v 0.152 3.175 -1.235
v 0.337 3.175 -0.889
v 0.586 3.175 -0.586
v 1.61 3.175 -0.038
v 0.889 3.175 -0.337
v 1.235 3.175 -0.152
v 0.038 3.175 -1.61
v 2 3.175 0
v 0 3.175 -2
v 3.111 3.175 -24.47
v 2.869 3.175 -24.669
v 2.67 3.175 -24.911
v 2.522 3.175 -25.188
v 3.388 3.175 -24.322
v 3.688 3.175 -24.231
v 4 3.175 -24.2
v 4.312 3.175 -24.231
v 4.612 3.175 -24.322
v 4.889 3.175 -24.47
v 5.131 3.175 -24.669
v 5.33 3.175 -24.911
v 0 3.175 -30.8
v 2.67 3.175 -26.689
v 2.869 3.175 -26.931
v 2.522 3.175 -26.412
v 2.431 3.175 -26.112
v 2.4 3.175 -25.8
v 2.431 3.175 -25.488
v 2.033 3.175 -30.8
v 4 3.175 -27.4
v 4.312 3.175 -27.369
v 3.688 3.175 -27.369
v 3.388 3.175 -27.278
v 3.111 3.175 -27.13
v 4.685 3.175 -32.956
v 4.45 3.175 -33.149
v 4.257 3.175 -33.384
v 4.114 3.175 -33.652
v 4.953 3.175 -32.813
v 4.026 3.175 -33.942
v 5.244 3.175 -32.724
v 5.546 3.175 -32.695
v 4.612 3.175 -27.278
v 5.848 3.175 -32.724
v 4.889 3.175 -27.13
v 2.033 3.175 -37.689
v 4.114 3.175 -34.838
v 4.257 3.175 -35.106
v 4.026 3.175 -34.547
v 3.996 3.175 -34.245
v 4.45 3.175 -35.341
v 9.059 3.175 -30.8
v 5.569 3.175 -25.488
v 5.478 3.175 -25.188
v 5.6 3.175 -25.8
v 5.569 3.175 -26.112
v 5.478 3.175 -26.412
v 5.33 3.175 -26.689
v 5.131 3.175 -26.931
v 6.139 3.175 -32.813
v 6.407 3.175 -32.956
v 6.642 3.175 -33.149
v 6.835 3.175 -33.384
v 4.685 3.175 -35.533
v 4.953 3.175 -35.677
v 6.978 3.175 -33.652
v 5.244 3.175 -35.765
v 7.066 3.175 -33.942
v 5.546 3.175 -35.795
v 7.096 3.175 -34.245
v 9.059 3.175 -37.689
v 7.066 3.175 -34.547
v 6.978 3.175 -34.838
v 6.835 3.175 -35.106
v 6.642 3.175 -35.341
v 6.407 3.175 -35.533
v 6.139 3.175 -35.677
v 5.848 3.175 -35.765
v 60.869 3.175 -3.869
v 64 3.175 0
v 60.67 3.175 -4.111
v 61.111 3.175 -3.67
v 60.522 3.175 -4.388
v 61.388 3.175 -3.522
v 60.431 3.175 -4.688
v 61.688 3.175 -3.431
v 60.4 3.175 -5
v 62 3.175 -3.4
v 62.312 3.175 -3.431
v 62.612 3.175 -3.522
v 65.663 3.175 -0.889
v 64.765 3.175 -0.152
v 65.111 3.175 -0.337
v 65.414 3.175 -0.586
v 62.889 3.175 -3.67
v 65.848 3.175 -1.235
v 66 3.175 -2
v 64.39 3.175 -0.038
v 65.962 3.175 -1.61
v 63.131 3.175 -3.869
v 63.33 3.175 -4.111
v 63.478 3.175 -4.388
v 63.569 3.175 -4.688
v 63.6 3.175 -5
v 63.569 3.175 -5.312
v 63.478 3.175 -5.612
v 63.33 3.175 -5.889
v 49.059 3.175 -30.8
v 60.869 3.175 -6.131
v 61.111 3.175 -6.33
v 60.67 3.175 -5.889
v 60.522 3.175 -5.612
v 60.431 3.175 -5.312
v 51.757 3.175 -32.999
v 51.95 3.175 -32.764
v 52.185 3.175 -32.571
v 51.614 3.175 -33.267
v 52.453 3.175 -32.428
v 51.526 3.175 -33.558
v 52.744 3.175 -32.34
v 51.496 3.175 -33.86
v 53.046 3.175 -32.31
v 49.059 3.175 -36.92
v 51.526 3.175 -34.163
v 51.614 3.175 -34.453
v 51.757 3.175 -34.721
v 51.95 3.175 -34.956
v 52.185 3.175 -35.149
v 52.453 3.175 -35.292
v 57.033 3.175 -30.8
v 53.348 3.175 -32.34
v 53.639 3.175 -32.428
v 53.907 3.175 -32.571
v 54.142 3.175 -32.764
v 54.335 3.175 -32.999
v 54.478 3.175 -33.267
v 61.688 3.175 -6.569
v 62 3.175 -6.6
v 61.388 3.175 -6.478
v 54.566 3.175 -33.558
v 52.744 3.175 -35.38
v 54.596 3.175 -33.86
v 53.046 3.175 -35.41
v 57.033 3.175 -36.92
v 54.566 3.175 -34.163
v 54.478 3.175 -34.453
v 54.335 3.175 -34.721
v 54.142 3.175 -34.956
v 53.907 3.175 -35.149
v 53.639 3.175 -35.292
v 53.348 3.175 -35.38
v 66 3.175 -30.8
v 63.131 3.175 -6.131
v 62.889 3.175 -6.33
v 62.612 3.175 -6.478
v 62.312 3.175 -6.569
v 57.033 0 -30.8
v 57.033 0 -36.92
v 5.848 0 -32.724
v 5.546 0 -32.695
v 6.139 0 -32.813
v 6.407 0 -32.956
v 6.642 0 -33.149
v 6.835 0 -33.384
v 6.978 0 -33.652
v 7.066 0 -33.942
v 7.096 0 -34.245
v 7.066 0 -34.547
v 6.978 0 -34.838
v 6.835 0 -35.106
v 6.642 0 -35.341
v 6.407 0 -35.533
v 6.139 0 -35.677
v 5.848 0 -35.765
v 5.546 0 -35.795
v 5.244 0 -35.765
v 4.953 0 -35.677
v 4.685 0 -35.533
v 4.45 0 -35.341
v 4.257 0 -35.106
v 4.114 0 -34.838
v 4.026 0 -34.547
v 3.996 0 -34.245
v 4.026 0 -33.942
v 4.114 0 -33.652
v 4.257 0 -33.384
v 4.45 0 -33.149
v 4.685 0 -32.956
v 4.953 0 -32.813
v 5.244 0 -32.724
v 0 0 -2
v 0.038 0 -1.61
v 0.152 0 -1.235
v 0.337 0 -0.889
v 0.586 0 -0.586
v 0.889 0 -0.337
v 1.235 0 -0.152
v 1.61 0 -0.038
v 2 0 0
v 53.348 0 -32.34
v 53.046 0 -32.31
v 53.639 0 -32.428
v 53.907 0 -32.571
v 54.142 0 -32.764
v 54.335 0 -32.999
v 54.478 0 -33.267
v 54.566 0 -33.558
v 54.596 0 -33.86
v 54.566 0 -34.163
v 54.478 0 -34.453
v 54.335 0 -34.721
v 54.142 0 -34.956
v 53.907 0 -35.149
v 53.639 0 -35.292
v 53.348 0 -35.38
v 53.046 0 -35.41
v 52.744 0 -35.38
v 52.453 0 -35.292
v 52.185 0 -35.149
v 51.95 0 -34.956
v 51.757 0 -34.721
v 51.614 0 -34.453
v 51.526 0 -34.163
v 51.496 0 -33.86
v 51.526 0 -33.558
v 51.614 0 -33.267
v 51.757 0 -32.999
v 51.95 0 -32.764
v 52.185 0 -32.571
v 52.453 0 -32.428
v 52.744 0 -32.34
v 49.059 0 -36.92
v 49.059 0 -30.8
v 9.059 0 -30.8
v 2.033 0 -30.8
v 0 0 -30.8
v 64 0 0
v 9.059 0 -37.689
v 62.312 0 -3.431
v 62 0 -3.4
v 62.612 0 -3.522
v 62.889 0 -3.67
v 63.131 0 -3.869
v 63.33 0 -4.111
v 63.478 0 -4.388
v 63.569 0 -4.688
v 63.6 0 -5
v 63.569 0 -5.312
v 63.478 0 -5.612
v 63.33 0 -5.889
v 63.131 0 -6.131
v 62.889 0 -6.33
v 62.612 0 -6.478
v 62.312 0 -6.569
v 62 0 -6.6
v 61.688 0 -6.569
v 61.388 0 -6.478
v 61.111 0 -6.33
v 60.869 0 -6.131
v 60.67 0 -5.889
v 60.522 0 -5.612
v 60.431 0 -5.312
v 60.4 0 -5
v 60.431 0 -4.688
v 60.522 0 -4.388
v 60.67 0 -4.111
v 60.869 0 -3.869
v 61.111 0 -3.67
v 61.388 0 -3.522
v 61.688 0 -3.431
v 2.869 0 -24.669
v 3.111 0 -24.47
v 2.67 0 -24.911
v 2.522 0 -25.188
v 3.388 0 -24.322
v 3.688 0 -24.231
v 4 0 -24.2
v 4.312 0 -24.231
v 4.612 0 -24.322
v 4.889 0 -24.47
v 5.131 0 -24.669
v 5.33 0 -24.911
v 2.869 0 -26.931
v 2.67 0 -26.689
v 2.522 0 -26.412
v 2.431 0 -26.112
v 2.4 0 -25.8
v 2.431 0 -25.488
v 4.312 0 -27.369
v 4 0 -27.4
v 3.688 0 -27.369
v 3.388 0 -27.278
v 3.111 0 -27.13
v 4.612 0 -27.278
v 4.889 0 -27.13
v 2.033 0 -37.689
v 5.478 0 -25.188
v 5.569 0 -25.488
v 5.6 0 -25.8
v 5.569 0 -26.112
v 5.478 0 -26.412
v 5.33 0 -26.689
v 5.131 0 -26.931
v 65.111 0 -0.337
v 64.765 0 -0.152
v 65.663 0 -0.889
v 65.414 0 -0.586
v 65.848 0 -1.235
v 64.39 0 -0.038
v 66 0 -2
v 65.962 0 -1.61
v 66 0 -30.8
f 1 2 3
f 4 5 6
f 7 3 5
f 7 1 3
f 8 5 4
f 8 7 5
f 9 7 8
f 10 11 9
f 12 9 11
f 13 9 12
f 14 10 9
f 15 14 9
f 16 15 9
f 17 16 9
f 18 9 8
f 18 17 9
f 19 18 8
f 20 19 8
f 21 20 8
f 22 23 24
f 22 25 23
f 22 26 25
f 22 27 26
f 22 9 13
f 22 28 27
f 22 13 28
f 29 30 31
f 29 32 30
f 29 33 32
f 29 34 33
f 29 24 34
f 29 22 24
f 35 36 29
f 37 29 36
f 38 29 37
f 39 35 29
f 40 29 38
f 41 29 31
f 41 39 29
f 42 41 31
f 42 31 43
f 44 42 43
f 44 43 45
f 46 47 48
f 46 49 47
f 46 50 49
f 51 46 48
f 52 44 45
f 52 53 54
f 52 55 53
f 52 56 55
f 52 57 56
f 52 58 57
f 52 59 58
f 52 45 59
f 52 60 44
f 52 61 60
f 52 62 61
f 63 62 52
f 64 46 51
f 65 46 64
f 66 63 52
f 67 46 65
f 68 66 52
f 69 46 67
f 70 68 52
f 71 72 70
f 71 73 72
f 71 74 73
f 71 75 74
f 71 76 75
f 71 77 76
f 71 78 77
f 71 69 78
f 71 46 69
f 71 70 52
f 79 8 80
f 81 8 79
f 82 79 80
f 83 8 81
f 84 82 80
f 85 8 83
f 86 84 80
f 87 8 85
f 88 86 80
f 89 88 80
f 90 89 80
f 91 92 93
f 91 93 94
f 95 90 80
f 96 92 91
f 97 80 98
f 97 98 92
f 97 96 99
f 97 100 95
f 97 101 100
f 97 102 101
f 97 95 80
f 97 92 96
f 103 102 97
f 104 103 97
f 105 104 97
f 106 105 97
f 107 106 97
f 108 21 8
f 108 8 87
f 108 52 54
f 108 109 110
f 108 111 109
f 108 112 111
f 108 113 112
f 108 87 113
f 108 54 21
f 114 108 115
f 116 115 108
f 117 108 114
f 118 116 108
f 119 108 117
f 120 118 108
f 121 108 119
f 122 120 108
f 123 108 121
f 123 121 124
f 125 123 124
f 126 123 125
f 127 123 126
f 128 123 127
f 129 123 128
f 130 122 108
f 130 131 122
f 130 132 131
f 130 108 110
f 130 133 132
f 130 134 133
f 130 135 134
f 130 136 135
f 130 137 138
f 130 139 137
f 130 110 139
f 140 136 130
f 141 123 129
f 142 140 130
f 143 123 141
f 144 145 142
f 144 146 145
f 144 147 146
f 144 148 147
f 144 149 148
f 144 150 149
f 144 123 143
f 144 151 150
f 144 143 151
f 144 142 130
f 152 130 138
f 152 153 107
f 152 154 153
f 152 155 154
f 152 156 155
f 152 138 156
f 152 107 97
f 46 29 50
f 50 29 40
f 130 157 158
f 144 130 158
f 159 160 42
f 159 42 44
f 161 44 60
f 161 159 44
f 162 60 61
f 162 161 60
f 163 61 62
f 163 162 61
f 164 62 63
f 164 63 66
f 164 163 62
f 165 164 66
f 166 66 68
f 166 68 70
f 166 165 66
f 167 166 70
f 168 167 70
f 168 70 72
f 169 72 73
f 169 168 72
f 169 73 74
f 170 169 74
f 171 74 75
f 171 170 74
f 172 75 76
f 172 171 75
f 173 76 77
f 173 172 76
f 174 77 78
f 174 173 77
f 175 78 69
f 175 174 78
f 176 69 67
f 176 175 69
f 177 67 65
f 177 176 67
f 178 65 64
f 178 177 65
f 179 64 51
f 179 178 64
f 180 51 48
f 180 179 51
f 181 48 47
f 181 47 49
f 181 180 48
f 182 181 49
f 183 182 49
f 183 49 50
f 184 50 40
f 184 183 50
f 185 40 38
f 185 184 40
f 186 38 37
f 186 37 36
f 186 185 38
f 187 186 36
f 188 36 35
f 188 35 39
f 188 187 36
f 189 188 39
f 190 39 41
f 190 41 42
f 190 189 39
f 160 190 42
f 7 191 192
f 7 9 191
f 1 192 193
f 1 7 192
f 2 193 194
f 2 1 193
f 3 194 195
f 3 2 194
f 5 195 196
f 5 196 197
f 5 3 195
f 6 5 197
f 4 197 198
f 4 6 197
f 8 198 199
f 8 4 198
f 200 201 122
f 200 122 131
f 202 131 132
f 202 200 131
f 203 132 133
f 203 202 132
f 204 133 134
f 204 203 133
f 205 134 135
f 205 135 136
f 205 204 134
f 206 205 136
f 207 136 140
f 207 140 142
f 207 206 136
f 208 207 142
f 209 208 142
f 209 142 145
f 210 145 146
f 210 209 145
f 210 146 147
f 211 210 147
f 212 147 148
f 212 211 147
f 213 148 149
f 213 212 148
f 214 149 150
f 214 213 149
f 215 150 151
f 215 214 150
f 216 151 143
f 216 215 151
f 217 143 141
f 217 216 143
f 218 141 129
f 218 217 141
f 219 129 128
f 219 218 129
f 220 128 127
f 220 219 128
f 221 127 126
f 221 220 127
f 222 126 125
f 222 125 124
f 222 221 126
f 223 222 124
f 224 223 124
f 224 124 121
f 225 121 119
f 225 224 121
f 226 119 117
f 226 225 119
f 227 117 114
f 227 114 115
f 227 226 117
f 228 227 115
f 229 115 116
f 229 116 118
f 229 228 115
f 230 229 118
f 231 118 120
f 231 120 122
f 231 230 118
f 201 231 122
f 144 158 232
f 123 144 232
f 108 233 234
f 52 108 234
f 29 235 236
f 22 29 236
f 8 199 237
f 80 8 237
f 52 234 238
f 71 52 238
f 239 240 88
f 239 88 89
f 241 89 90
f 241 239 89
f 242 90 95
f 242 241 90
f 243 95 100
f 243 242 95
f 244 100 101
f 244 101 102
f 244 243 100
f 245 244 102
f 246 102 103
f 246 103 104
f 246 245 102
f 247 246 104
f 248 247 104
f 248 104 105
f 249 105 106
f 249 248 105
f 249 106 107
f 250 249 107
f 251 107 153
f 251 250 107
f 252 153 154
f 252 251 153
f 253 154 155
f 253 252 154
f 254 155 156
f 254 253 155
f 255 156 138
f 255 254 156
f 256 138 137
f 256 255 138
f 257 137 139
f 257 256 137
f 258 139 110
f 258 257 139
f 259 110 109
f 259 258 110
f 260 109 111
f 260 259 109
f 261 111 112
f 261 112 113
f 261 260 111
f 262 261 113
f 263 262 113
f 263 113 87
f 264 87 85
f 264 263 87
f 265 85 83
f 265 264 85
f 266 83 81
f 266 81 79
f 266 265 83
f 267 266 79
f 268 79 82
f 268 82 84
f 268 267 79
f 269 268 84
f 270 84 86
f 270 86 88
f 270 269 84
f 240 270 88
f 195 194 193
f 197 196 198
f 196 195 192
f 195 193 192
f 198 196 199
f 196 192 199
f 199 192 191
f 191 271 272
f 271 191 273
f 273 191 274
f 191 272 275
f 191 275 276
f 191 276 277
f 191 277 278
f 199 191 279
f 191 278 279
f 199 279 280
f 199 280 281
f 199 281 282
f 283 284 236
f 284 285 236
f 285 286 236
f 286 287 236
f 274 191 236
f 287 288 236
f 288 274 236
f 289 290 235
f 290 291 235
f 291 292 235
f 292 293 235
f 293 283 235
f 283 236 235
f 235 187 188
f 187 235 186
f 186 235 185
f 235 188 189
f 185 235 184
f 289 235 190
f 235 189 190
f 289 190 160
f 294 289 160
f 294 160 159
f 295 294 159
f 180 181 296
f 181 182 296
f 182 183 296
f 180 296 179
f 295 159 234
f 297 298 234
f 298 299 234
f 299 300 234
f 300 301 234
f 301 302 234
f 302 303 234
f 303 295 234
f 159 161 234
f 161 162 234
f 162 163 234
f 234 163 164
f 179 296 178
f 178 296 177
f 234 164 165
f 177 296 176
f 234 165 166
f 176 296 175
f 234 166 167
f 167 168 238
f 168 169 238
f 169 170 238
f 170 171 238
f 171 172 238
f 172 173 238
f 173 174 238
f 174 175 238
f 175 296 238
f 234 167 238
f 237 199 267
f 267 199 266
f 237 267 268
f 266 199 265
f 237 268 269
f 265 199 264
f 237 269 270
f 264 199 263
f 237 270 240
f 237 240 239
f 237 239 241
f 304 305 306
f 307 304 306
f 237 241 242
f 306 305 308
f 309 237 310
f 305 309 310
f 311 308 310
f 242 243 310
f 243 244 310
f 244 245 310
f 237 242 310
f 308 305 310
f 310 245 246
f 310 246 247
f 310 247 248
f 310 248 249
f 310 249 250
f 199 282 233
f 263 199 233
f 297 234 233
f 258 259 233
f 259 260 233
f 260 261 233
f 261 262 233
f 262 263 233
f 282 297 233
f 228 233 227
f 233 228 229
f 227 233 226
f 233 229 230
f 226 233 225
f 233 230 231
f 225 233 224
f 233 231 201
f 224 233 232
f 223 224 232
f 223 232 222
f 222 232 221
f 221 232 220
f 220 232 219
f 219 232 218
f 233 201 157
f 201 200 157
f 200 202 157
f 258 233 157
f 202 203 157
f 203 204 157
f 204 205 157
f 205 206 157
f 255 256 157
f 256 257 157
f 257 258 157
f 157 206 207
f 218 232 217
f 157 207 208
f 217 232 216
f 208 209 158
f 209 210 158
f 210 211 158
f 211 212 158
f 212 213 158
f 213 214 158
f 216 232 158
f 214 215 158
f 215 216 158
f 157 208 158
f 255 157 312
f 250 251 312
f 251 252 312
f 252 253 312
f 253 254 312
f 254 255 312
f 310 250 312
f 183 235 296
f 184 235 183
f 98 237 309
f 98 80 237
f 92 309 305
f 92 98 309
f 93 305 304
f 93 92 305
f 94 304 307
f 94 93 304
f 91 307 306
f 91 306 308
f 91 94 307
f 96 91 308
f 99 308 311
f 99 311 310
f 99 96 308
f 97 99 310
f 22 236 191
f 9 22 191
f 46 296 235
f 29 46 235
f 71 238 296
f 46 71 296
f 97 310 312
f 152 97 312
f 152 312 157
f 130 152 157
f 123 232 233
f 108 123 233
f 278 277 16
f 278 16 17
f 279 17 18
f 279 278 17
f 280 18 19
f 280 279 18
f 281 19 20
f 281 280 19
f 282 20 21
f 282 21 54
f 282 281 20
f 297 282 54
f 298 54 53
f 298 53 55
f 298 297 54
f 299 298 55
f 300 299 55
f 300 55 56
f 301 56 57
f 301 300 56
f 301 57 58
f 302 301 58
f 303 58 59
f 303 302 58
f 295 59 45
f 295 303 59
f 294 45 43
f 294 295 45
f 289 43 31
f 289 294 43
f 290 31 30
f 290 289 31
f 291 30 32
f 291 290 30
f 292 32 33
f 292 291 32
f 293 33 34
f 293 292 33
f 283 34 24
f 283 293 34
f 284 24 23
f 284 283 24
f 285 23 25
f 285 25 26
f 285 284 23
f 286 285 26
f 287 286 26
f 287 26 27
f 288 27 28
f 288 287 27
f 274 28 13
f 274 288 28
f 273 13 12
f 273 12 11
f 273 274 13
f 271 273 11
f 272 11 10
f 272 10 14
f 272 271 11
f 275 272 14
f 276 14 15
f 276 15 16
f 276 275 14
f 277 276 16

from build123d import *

# Parameters (mm, degrees)
SKETCH2_R           = 1.6
SKETCH2_R_2         = 1.550000008
SKETCH2_R_3         = 1.55
BOSS_EXTRUDE1_DEPTH = 3.175
FILLET1_R           = 2


with BuildPart() as part:
    # Sketch2 → Boss-Extrude1 (new body)
    with BuildSketch(Plane(origin=(0, 0, 0), x_dir=(1, 0, 0), z_dir=(0, 1, 0))):
        Polygon((9.058586069, 30.8), (9.058586069, 37.689356794), (2.033404749, 37.689356794), (2.033404749, 30.8), (0, 30.8), (0, 0), (66, 0), (66, 30.8), (57.033404749, 30.8), (57.033404749, 36.920267815), (49.058586069, 36.920267815), (49.058586069, 30.8), align=None)
        with Locations(Location((62, 5, 0), (0, 0, 270))):
            Circle(SKETCH2_R, mode=Mode.SUBTRACT)
        with Locations(Location((4, 25.8, 0), (0, 0, 270))):
            Circle(SKETCH2_R, mode=Mode.SUBTRACT)
        with Locations(Location((5.545995409, 34.244678397, 0), (0, 0, 270))):
            Circle(SKETCH2_R_2, mode=Mode.SUBTRACT)
        with Locations(Location((53.045995409, 33.860133908, 0), (0, 0, 270))):
            Circle(SKETCH2_R_3, mode=Mode.SUBTRACT)
    extrude(amount=BOSS_EXTRUDE1_DEPTH)

    # Fillet1
    fillet1_edges = [part.edges().sort_by_distance(p)[0] for p in [
        (66, 1.5875, 0),
        (0, 1.5875, 0),
    ]]
    fillet(fillet1_edges, radius=FILLET1_R)


solid = part.part
